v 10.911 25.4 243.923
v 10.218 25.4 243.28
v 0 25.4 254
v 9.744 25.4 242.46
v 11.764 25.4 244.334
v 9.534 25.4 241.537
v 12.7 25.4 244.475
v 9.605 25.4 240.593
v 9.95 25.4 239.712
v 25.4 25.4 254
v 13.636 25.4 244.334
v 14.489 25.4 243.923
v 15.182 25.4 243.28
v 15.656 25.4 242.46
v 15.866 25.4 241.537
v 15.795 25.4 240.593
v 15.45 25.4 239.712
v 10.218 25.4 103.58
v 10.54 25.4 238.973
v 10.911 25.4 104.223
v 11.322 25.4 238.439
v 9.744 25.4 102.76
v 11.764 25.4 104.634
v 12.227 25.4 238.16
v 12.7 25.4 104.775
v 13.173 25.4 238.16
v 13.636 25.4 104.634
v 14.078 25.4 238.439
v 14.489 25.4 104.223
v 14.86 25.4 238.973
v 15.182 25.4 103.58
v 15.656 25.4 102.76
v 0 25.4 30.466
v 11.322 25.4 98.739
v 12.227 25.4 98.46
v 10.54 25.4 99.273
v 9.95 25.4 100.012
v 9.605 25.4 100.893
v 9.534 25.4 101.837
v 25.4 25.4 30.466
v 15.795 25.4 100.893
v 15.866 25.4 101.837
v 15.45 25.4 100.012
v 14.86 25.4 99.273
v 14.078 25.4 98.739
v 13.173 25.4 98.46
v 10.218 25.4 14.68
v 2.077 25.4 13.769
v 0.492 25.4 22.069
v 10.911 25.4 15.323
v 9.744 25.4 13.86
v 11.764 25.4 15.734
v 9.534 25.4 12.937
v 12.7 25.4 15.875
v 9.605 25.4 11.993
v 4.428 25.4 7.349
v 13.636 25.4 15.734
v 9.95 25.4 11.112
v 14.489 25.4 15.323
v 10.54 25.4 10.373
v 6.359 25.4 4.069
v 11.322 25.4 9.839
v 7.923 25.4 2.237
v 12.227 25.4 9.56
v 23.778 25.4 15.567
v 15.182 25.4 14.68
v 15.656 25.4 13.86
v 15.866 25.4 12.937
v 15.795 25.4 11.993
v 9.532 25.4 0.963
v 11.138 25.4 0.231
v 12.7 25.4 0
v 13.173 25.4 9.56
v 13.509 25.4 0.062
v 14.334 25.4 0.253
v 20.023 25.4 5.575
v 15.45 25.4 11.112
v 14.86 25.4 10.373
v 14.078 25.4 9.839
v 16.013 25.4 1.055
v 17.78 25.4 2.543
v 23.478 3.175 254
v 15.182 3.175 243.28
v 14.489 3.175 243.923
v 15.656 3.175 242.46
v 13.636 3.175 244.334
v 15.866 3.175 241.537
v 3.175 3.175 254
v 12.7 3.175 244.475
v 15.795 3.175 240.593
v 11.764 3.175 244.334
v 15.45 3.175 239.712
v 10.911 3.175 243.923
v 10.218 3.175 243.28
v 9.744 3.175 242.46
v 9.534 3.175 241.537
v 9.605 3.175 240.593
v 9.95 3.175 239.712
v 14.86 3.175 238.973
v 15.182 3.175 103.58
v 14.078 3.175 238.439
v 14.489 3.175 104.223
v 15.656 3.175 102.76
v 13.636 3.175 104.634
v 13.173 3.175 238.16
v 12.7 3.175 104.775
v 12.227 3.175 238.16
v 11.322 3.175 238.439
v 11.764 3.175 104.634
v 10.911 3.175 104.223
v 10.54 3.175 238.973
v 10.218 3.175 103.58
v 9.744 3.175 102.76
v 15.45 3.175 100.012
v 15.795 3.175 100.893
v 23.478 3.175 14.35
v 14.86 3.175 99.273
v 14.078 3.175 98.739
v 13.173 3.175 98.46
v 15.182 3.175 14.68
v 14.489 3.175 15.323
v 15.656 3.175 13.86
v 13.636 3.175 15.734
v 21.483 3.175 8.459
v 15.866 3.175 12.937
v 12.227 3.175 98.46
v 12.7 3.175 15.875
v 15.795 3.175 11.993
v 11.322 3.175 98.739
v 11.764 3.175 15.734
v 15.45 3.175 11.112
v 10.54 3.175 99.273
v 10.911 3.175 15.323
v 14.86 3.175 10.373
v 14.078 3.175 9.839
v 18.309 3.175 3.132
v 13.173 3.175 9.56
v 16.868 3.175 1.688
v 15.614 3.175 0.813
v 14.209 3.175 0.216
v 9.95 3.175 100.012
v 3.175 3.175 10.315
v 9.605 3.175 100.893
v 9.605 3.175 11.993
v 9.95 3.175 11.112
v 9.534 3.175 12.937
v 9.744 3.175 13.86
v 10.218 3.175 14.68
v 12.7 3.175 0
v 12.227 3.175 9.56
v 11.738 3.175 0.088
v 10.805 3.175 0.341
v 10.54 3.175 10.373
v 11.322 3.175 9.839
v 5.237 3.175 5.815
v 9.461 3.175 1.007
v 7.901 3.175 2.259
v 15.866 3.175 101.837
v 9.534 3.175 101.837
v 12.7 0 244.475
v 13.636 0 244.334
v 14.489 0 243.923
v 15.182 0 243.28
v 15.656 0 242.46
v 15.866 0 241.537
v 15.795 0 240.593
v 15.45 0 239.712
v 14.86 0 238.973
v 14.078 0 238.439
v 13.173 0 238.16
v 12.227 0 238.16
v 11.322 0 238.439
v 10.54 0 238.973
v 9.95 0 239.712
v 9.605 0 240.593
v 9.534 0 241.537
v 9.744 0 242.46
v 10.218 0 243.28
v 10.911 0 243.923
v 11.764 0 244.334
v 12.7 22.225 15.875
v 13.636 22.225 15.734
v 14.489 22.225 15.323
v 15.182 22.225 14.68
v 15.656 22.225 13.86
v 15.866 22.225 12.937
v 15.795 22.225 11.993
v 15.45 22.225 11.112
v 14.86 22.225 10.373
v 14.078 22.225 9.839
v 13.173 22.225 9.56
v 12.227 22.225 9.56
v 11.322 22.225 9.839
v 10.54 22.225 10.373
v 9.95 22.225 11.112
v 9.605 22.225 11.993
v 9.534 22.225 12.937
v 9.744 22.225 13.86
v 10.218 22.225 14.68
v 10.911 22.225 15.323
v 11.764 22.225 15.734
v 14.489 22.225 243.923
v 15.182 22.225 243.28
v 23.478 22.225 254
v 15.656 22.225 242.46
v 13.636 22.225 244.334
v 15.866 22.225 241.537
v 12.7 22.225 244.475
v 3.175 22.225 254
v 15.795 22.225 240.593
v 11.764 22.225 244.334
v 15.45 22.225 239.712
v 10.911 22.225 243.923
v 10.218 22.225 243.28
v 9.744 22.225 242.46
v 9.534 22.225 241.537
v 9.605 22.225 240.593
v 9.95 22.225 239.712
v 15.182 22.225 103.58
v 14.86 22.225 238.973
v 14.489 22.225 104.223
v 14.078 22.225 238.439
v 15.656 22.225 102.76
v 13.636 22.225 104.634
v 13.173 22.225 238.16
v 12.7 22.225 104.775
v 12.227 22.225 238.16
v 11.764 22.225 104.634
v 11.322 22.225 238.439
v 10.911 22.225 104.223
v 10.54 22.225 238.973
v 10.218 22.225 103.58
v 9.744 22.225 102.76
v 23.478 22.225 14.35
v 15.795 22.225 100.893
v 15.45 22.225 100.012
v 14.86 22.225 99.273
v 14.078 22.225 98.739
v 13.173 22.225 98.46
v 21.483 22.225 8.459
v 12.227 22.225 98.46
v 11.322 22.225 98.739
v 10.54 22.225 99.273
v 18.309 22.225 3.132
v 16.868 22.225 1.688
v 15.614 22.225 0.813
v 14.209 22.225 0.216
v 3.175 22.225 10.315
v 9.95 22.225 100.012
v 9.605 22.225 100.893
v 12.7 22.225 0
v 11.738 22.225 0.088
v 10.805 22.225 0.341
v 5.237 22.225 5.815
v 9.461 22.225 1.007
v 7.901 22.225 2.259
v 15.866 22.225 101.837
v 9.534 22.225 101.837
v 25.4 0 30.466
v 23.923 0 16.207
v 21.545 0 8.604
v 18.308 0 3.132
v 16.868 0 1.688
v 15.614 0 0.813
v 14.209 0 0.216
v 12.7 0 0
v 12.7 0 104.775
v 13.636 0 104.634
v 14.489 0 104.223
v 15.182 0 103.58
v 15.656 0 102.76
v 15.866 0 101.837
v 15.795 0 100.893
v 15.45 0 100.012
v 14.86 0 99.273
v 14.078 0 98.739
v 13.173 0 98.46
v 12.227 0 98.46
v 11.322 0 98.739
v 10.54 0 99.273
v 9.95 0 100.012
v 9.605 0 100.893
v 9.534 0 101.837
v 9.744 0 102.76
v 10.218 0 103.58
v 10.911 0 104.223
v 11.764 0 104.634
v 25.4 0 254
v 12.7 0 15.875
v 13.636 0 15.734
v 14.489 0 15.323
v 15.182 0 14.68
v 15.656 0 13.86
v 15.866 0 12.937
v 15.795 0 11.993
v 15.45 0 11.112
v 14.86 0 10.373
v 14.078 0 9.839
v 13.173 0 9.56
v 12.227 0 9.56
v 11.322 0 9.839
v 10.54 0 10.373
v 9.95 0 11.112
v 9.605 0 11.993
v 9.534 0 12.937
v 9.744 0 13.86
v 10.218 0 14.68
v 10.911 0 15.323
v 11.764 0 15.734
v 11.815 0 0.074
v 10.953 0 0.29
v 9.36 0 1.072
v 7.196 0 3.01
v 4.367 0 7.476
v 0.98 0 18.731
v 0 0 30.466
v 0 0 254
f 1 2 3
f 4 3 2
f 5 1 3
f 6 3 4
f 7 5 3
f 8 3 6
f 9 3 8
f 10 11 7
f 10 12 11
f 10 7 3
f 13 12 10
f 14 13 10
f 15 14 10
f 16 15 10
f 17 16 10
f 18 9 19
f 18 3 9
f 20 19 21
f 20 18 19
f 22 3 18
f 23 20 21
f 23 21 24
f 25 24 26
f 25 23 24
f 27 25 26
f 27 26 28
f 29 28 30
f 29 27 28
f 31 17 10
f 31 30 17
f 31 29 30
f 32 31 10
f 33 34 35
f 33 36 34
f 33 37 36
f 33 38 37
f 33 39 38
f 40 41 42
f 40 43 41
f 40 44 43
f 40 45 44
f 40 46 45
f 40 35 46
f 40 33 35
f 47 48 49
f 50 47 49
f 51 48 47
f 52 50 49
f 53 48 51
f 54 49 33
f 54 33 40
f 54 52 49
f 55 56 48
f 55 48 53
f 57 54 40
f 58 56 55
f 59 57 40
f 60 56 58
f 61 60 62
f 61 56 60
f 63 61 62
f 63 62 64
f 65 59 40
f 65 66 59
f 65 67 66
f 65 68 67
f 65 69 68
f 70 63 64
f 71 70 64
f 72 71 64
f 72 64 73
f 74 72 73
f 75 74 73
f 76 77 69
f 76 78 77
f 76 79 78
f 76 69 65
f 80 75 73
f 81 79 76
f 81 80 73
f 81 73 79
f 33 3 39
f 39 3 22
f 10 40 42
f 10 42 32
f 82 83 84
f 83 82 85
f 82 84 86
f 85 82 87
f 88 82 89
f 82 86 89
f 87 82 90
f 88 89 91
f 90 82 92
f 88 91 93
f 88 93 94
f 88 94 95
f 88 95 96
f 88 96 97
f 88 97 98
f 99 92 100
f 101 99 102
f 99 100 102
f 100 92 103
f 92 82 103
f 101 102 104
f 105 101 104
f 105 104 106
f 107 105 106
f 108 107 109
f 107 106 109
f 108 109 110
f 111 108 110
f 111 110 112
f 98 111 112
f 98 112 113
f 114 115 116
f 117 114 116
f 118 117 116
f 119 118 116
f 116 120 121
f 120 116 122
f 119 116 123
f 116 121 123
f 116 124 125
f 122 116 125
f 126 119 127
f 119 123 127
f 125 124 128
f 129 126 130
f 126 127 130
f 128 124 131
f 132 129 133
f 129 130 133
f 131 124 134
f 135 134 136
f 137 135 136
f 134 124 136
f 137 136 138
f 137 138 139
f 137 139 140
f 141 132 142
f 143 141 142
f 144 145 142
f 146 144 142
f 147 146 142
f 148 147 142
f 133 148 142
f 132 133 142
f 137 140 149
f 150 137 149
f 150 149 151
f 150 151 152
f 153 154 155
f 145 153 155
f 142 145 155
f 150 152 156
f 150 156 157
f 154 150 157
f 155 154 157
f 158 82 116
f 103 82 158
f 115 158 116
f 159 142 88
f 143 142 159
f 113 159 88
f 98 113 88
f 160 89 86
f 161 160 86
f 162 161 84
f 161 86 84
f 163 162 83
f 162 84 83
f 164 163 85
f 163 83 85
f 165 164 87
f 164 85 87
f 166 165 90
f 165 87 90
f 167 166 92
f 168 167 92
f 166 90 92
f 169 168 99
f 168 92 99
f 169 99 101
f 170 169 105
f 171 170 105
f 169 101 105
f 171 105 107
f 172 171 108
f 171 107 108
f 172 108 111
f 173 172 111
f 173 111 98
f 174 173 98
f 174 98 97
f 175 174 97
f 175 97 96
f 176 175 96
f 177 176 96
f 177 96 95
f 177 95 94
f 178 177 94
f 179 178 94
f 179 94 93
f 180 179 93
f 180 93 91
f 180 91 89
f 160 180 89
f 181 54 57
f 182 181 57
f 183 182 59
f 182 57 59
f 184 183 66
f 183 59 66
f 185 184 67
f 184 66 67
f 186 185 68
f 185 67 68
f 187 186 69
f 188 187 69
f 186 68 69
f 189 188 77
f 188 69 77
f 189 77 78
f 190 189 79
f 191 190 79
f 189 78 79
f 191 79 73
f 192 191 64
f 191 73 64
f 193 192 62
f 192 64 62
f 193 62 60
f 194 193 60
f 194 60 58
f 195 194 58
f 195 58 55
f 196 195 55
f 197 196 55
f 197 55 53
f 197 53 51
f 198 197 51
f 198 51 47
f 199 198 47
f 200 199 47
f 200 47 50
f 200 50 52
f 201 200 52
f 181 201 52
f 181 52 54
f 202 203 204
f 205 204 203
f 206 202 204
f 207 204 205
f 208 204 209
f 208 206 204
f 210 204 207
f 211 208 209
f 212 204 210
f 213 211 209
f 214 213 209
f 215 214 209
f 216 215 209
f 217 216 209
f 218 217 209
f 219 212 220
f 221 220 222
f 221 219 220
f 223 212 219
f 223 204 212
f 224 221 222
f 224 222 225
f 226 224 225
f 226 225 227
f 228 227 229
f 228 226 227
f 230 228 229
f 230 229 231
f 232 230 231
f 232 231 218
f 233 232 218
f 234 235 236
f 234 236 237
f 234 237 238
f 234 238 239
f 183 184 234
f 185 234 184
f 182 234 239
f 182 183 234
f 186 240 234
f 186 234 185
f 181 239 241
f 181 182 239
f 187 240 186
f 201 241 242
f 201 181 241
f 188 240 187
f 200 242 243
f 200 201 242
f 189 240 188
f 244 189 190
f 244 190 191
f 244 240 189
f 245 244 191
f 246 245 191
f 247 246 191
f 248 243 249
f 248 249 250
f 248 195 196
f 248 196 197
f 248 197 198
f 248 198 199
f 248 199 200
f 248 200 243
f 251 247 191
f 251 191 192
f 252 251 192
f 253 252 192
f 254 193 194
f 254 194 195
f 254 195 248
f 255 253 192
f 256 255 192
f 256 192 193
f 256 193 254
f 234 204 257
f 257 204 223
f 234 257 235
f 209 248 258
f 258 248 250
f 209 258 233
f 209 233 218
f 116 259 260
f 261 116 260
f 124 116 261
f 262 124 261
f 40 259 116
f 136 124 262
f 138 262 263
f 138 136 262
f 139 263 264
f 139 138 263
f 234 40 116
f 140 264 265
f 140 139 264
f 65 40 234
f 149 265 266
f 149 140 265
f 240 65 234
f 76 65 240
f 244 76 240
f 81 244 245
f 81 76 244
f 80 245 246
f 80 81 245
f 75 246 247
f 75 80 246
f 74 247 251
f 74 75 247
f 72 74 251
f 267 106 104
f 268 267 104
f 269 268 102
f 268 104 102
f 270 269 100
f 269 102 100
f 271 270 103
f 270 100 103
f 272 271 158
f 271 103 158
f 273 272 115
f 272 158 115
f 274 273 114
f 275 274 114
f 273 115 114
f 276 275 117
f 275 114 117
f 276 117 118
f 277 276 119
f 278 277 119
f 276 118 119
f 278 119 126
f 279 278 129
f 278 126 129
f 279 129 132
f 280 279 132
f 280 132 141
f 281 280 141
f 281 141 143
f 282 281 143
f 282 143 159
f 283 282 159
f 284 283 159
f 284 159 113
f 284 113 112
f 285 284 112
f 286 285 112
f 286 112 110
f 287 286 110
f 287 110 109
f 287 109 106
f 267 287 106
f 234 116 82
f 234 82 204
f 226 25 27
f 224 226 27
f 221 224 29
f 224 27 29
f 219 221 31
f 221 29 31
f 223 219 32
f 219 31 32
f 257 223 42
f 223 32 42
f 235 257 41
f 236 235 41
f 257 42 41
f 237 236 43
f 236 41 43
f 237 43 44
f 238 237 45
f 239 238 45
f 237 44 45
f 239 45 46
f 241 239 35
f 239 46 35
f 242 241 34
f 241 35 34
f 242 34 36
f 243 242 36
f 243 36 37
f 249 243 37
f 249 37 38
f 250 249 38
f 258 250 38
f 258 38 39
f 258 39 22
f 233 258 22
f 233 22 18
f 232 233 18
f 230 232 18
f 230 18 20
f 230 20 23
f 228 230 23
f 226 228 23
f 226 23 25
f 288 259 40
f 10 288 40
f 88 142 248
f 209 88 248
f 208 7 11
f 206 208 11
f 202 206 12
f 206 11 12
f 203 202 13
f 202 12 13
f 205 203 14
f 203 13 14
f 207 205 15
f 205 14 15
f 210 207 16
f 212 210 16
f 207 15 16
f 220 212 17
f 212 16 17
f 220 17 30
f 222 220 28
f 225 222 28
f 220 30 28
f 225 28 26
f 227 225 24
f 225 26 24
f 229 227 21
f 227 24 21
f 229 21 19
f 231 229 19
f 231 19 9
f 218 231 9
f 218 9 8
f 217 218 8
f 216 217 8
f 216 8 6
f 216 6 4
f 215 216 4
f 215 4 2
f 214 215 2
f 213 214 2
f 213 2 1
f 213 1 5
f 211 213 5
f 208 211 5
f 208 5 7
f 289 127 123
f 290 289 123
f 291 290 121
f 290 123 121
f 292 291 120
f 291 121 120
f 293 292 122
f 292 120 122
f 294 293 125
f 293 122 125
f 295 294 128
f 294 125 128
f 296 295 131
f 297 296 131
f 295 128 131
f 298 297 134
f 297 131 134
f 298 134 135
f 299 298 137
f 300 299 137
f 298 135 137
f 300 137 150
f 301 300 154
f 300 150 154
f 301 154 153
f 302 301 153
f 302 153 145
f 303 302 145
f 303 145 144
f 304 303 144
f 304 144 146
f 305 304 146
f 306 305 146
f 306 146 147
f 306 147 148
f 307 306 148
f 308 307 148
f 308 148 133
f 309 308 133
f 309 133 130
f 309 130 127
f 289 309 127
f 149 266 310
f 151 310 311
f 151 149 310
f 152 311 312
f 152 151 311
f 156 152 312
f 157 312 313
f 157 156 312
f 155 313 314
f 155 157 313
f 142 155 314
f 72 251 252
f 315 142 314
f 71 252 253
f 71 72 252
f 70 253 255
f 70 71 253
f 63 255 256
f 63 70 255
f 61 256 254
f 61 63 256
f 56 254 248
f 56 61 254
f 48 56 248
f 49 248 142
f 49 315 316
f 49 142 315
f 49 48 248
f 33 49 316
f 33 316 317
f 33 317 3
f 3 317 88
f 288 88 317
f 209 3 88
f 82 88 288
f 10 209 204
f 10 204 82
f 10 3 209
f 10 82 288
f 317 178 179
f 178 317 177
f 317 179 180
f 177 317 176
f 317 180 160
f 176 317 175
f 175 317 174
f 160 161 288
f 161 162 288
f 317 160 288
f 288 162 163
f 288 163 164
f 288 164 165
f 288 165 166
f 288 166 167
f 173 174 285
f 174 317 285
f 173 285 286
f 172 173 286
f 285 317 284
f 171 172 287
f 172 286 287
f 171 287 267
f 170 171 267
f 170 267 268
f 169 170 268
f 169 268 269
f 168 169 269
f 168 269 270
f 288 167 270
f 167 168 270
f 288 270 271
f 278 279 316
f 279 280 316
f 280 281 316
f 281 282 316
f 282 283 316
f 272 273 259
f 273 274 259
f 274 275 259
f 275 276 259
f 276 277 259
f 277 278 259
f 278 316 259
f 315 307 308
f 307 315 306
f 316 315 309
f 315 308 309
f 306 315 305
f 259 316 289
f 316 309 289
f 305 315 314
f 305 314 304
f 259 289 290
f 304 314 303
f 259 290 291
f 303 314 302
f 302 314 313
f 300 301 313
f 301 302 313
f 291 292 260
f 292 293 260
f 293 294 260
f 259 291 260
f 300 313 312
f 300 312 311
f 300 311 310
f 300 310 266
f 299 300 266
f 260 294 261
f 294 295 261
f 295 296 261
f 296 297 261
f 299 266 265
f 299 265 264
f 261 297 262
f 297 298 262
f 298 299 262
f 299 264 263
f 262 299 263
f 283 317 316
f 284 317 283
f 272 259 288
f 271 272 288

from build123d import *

# Parameters (mm, degrees)
SKETCH1_W           = 25.4
SKETCH1_H           = 25.4
BOSS_EXTRUDE2_DEPTH = 254
SKETCH2_W           = 20.302766191
SKETCH2_H           = 19.05
CUT_EXTRUDE1_DEPTH  = 257.527425434
CUT_EXTRUDE2_DEPTH  = 257.527425434
SKETCH6_R           = 3.175
CUT_EXTRUDE5_DEPTH  = 257.527425553
SKETCH4_R           = 3.175
CUT_EXTRUDE6_DEPTH  = 257.527425553
SKETCH7_R           = 3.175
CUT_EXTRUDE7_DEPTH  = 257.527425553


with BuildPart() as part:
    # Sketch1 → Boss-Extrude2 (new body)
    with BuildSketch(Plane.XY):
        with Locations((12.7, 12.7)):
            Rectangle(SKETCH1_W, SKETCH1_H)
    extrude(amount=BOSS_EXTRUDE2_DEPTH)

    # Sketch2 → Cut-Extrude1 (cut, through all)
    with BuildSketch(Plane(origin=(0, 0, 0), x_dir=(-1, 0, 0), z_dir=(0, 0, -1))):
        with Locations((-13.326383096, 12.7)):
            Rectangle(SKETCH2_W, SKETCH2_H)
    extrude(amount=-CUT_EXTRUDE1_DEPTH, mode=Mode.SUBTRACT)

    # Sketch3 → Cut-Extrude2 (cut, through all)
    with BuildSketch(Plane(origin=(0, 25.4, 0), x_dir=(1, 0, 0), z_dir=(0, 1, 0))):
        with BuildLine():
            add(Edge.make_bspline(
                [(12.7, 0), (0, 0), (0, -30.465860076)],
                knots=[6.283185307, 6.283185307, 6.283185307, 7.853981634, 7.853981634, 7.853981634], degree=2, weights=[1, 0.707106781, 1]))
            Line((12.7, 0), (0, 0))
            Line((0, 0), (0, -30.465860076))
        make_face()
        with BuildLine():
            Line((25.4, 0), (12.7, 0))
            add(Edge.make_bspline(
                [(25.4, -30.465860076), (25.4, 0), (12.7, 0)],
                knots=[4.71238898, 4.71238898, 4.71238898, 6.283185307, 6.283185307, 6.283185307], degree=2, weights=[1, 0.707106781, 1]))
            Line((25.4, -30.465860076), (25.4, 0))
        make_face()
    extrude(amount=-CUT_EXTRUDE2_DEPTH, mode=Mode.SUBTRACT)

    # Sketch6 → Cut-Extrude5 (cut, through all)
    with BuildSketch(Plane(origin=(0, 25.4, 0), x_dir=(1, 0, 0), z_dir=(0, 1, 0))):
        with Locations(Location((12.7, -12.7, 0), (0, 0, 270))):
            Circle(SKETCH6_R)
    extrude(amount=-CUT_EXTRUDE5_DEPTH, mode=Mode.SUBTRACT)

    # Sketch4 → Cut-Extrude6 (cut, through all)
    with BuildSketch(Plane(origin=(0, 25.4, 0), x_dir=(1, 0, 0), z_dir=(0, 1, 0))):
        with Locations(Location((12.7, -101.6, 0), (0, 0, 270))):
            Circle(SKETCH4_R)
    extrude(amount=-CUT_EXTRUDE6_DEPTH, mode=Mode.SUBTRACT)

    # Sketch7 → Cut-Extrude7 (cut, through all)
    with BuildSketch(Plane(origin=(0, 25.4, 0), x_dir=(1, 0, 0), z_dir=(0, 1, 0))):
        with Locations(Location((12.7, -241.3, 0), (0, 0, 270))):
            Circle(SKETCH7_R)
    extrude(amount=-CUT_EXTRUDE7_DEPTH, mode=Mode.SUBTRACT)


solid = part.part
